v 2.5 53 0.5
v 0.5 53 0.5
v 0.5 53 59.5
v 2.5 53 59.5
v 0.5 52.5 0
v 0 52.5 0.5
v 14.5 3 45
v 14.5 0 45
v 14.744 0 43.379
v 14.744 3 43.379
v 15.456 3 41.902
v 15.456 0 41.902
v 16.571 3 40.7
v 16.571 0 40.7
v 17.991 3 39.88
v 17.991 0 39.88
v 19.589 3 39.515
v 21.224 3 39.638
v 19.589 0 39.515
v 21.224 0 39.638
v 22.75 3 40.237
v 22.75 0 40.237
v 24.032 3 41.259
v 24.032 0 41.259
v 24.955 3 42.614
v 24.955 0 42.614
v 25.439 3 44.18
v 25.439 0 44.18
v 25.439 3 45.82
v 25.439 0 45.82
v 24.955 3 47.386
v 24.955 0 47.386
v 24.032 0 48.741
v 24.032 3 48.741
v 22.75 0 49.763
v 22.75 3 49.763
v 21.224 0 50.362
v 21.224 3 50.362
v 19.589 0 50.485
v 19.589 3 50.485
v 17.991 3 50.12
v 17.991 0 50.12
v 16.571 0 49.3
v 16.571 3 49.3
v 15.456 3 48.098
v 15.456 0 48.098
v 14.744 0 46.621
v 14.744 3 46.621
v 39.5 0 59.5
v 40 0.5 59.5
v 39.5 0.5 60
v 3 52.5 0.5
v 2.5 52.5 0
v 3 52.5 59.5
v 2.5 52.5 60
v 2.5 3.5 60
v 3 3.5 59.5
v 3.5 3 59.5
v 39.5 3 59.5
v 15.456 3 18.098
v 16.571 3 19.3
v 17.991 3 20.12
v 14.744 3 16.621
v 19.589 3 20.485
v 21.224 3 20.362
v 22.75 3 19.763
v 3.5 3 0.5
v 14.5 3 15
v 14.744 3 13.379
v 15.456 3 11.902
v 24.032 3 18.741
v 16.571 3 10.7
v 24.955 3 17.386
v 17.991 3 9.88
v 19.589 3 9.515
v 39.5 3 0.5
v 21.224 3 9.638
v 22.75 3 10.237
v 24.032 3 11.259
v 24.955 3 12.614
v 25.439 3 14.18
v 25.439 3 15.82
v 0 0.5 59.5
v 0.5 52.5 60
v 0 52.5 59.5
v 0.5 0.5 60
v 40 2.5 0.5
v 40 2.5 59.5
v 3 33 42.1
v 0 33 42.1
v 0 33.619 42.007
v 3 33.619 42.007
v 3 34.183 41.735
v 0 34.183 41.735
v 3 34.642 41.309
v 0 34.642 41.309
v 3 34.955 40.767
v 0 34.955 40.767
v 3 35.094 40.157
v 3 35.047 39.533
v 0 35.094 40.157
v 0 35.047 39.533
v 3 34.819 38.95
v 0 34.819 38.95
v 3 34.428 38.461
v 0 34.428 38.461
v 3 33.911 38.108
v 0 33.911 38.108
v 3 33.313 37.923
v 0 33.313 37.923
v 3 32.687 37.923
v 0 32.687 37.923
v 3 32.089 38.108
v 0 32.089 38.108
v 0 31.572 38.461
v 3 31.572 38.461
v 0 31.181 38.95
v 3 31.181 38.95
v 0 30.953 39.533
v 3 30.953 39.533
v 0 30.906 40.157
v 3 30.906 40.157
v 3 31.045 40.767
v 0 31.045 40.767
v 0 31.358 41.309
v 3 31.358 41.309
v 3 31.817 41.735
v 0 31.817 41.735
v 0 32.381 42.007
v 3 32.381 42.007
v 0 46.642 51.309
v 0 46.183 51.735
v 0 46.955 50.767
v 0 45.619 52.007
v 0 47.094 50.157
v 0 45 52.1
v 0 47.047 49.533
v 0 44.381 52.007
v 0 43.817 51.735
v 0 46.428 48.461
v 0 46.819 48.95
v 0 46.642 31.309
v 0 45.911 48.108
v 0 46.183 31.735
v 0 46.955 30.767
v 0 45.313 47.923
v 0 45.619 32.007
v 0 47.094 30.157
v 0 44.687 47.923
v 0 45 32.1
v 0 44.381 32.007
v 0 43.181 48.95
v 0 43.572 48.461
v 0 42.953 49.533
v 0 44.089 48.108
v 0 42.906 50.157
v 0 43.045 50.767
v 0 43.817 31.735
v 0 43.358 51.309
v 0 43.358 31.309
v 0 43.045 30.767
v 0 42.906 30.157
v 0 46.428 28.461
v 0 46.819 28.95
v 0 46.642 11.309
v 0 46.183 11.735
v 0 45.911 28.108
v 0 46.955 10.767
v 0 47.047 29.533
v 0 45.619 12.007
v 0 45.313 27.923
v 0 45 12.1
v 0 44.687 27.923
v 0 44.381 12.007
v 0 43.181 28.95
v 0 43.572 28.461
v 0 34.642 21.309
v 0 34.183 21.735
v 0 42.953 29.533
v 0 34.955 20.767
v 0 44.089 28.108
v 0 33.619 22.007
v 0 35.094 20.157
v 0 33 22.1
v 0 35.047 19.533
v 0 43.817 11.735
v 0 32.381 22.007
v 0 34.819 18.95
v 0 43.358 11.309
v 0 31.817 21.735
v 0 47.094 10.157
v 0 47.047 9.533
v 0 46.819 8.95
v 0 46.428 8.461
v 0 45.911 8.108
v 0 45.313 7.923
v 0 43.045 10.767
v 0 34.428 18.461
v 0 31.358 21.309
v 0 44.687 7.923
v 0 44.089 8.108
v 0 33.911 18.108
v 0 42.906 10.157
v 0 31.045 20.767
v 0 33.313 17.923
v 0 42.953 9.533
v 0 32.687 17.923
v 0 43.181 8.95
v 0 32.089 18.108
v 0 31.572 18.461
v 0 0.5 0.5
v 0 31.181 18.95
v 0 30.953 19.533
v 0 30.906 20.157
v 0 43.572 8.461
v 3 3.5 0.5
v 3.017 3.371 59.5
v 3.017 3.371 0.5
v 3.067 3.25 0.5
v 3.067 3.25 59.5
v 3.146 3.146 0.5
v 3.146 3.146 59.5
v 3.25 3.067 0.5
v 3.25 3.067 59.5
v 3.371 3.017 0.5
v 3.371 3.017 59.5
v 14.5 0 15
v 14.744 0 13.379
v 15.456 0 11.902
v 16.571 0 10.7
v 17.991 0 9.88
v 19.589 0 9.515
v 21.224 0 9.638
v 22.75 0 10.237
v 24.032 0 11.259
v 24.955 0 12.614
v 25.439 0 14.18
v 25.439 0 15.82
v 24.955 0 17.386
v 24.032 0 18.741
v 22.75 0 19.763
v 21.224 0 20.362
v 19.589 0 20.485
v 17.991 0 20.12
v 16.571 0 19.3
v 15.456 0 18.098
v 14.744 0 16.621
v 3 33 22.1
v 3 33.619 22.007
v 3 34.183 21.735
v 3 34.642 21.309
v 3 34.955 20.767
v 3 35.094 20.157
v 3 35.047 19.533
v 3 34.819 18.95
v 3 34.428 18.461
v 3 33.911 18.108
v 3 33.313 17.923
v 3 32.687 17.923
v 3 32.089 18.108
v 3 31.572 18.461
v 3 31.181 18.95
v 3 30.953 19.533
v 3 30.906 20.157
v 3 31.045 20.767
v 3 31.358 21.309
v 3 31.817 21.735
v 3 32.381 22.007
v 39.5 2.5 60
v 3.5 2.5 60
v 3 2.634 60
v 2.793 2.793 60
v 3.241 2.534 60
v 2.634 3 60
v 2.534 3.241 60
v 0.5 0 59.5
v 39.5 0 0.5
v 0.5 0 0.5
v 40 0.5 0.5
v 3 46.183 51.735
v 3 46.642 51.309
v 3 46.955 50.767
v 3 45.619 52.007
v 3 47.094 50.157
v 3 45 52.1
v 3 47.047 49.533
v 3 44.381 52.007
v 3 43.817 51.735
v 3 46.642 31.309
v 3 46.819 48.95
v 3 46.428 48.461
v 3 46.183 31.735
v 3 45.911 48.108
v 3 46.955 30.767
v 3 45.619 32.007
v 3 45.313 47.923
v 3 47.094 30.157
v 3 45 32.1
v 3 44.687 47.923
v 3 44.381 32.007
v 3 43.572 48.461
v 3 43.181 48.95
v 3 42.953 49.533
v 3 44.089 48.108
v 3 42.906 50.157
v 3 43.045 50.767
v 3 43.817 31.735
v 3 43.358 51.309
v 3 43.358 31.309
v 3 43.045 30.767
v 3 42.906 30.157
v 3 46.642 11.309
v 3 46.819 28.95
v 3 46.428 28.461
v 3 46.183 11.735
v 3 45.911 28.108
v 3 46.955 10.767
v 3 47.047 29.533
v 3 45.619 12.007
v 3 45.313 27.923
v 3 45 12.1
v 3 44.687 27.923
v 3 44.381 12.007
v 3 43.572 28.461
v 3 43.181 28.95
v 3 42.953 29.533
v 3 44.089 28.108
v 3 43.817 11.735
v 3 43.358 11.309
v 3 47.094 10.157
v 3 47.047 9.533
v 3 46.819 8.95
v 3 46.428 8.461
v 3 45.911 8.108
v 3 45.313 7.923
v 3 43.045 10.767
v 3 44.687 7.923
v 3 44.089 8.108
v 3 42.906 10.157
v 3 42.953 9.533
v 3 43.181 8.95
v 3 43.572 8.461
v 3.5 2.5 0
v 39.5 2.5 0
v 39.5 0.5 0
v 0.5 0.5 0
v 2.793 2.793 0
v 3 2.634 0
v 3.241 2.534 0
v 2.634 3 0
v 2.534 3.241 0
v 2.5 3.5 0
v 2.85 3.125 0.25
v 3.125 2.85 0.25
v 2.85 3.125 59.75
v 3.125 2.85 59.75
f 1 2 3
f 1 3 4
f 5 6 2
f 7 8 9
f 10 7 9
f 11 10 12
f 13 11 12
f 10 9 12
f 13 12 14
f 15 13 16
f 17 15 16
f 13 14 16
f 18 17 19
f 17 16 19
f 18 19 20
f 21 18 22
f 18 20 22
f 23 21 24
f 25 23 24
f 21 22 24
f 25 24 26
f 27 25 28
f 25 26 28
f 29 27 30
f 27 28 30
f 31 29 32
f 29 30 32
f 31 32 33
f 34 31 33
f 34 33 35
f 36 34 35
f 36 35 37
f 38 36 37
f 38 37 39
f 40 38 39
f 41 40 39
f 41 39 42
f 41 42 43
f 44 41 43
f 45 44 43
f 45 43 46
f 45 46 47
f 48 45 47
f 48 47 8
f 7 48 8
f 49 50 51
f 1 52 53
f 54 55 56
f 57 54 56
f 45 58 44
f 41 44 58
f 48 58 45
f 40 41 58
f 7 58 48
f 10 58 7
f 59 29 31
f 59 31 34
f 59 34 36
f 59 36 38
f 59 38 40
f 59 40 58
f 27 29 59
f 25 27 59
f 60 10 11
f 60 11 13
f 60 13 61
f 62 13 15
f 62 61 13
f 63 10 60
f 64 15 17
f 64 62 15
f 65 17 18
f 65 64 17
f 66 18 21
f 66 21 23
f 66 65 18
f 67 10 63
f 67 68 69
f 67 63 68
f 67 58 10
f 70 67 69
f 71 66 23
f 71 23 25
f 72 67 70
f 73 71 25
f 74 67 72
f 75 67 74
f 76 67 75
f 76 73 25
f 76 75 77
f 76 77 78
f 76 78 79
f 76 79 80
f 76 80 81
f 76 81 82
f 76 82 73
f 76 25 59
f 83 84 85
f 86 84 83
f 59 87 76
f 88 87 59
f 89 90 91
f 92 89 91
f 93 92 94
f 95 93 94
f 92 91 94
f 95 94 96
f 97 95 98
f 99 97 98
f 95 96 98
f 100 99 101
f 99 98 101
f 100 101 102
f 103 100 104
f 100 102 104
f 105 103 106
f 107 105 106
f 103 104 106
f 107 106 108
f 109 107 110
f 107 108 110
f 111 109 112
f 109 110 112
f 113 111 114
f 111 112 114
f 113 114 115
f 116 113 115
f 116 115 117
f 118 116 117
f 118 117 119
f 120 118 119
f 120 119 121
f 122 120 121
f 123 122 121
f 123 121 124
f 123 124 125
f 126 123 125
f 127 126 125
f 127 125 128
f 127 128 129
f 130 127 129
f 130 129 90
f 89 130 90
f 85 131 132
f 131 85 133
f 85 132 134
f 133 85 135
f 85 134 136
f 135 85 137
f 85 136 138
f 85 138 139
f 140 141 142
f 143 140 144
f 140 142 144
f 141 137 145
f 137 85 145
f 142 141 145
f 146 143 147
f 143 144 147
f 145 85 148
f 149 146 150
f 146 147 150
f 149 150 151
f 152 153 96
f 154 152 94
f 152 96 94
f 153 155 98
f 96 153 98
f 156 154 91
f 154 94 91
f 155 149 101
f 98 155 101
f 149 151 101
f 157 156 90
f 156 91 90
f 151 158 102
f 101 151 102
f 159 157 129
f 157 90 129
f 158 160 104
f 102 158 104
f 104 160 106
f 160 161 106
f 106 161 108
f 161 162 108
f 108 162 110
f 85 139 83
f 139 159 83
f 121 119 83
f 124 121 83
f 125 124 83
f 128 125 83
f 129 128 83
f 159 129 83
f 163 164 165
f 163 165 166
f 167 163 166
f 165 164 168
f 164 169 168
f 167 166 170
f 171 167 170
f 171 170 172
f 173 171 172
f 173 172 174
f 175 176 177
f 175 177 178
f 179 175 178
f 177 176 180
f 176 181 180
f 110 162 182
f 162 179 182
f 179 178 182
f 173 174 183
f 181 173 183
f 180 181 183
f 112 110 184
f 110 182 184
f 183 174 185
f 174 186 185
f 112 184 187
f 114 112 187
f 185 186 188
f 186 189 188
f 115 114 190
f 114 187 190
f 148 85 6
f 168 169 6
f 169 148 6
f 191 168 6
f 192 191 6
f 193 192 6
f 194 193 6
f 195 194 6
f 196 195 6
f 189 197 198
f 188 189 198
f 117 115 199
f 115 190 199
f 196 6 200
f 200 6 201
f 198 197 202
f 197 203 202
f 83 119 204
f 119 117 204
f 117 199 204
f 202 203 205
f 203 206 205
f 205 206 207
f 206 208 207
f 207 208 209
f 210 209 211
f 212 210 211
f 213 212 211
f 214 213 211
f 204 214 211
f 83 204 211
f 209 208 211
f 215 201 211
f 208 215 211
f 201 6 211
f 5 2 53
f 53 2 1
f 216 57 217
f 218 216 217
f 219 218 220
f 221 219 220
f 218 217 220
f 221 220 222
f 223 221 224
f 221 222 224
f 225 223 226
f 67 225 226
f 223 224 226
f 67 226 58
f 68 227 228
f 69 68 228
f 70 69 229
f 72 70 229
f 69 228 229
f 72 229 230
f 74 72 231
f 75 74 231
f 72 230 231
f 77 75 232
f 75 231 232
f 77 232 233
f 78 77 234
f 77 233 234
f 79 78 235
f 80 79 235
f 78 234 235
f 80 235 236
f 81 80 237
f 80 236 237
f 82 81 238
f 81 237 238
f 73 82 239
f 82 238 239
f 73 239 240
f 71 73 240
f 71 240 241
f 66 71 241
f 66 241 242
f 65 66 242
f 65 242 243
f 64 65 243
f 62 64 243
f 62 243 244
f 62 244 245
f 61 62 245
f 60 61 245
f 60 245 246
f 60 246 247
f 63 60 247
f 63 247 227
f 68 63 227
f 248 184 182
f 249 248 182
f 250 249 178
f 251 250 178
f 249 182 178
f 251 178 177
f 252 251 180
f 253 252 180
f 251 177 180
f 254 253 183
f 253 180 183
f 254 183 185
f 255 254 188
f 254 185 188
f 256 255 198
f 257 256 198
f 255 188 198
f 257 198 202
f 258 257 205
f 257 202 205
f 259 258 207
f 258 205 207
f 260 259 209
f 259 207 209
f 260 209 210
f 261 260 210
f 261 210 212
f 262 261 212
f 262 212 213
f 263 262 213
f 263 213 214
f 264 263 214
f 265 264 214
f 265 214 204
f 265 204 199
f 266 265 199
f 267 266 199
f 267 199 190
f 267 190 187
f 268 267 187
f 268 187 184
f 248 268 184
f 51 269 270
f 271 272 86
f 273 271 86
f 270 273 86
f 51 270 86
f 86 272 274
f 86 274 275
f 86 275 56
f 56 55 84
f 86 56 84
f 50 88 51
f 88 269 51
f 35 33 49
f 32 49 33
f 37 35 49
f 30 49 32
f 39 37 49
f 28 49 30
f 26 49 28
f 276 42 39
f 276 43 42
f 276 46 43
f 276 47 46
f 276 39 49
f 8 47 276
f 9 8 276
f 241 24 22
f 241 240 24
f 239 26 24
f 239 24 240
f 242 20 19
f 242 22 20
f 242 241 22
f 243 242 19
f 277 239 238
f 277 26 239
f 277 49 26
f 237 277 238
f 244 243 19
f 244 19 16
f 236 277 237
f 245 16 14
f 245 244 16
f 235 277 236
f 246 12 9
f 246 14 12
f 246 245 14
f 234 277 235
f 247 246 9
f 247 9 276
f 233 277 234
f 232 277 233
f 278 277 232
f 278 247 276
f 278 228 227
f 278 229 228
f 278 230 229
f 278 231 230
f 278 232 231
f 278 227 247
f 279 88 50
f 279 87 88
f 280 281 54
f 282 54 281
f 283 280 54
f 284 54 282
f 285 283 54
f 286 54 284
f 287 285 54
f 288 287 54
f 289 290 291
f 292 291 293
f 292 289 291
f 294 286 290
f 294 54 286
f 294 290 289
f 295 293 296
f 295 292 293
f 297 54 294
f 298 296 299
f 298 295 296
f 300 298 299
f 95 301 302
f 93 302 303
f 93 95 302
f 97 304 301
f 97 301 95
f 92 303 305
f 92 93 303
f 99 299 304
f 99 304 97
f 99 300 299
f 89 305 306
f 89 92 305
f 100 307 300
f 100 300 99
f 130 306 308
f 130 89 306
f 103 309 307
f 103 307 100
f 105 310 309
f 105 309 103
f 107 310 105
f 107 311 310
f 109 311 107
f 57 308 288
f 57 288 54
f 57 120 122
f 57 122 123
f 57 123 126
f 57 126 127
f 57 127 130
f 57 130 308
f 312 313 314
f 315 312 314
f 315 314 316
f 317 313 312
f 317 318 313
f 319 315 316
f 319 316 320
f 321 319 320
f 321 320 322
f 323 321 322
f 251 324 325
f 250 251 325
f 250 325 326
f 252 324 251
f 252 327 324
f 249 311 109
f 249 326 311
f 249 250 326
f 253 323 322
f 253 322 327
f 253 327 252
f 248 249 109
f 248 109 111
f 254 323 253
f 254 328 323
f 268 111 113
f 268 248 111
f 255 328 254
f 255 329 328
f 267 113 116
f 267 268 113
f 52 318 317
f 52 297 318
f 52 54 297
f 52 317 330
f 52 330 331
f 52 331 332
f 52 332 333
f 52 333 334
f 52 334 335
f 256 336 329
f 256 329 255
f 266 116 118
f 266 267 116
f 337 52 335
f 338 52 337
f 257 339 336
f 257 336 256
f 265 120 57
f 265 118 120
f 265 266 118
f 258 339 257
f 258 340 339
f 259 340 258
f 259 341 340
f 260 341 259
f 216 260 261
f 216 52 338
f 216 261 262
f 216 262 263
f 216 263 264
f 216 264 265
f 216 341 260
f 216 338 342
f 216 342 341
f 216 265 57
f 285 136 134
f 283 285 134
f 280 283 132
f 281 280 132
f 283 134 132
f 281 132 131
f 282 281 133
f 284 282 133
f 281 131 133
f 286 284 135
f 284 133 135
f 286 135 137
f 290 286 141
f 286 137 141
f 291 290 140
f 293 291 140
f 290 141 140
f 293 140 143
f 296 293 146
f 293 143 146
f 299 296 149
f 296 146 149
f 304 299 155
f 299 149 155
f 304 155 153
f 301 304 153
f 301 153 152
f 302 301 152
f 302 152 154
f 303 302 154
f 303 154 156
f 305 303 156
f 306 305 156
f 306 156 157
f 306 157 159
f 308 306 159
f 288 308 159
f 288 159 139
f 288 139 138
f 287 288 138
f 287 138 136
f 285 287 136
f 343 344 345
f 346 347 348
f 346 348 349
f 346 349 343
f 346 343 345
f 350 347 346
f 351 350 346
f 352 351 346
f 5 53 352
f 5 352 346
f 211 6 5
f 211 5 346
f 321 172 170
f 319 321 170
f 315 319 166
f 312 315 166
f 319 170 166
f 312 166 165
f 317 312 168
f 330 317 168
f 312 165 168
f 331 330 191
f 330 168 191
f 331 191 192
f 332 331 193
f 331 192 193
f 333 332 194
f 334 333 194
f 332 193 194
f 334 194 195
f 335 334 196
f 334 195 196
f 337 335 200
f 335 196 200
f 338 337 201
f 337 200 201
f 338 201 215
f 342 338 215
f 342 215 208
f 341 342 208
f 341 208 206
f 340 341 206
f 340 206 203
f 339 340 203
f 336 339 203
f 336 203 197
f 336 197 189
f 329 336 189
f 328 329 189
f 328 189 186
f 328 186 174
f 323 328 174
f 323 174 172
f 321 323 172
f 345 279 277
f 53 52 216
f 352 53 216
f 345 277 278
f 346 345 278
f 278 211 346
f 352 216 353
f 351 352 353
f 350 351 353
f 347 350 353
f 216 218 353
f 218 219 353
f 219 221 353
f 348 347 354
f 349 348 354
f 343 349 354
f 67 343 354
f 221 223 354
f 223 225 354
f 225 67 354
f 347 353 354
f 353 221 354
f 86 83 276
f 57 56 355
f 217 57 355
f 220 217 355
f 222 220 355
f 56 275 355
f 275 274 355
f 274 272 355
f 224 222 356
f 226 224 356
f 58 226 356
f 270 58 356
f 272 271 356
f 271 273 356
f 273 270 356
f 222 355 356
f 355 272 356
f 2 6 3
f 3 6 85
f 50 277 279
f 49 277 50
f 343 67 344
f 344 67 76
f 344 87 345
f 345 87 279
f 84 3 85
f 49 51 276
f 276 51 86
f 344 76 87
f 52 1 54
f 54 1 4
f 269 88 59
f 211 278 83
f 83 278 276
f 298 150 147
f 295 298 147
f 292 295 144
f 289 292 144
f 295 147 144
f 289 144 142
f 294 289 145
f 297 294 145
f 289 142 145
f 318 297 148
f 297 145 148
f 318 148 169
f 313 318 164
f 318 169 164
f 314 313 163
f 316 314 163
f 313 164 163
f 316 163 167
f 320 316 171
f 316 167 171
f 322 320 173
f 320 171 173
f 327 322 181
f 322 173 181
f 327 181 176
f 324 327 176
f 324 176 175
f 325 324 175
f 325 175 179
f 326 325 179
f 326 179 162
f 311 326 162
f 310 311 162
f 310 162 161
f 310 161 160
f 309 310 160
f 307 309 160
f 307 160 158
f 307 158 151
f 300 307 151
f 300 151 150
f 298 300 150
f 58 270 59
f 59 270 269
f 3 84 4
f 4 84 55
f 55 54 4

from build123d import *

# Parameters (mm, degrees)
DODANIE_WYCI_GNI_CIE1_DEPTH    = 60
OTWORY_USTALAJ_CE_1_0MM1_D     = 11
OTWORY_USTALAJ_CE_1_0MM1_DEPTH = 22.25
OTWORY_USTALAJ_CE_1_0MM1_TIP   = 3.304733405
OTW_R_GWINTOWANY_M51_D         = 4.2
OTW_R_GWINTOWANY_M51_DEPTH     = 14
OTW_R_GWINTOWANY_M51_TIP       = 1.2618073
ZAOKR_GLENIE1_R                = 0.5
SFAZOWANIE3_SIZE               = 0.5


with BuildPart() as part:
    # Szkic1 → Dodanie-wyciągnięcie1 (new body)
    with BuildSketch(Plane.XY):
        Polygon((0, 3), (0, 53), (3, 53), (3, 3), (40, 3), (40, 0), (0, 0), align=None)
    extrude(amount=DODANIE_WYCI_GNI_CIE1_DEPTH)

    # Otwory ustalające Ø1.0mm1
    with Locations(Plane(origin=(0, 3, 0), x_dir=(1, 0, 0), z_dir=(0, 1, 0))):
        with Locations((20, -45), (20, -15)):
            Hole(OTWORY_USTALAJ_CE_1_0MM1_D / 2, depth=OTWORY_USTALAJ_CE_1_0MM1_DEPTH)
            with Locations((0, 0, -(OTWORY_USTALAJ_CE_1_0MM1_DEPTH + OTWORY_USTALAJ_CE_1_0MM1_TIP / 2))):  # 118° drill point
                Cone(0, OTWORY_USTALAJ_CE_1_0MM1_D / 2, OTWORY_USTALAJ_CE_1_0MM1_TIP, mode=Mode.SUBTRACT)

    # Otwór gwintowany M51
    with Locations(Plane(origin=(3, 0, 0), x_dir=(0, 0, -1), z_dir=(1, 0, 0))):
        with Locations((-50, 45), (-40, 33), (-30, 45), (-20, 33), (-10, 45)):
            Hole(OTW_R_GWINTOWANY_M51_D / 2, depth=OTW_R_GWINTOWANY_M51_DEPTH)
            with Locations((0, 0, -(OTW_R_GWINTOWANY_M51_DEPTH + OTW_R_GWINTOWANY_M51_TIP / 2))):  # 118° drill point
                Cone(0, OTW_R_GWINTOWANY_M51_D / 2, OTW_R_GWINTOWANY_M51_TIP, mode=Mode.SUBTRACT)

    # Zaokrąglenie1
    zaokr_glenie1_edges = [part.edges().sort_by_distance(p)[0] for p in [
        (3, 3, 30),
    ]]
    fillet(zaokr_glenie1_edges, radius=ZAOKR_GLENIE1_R)

    # Sfazowanie3
    sfazowanie3_edges = [part.edges().sort_by_distance(p)[0] for p in [
        (0, 53, 30),
        (3, 53, 30),
        (40, 1.5, 60),
        (40, 3, 30),
        (40, 0, 30),
        (0, 0, 30),
        (21.75, 3, 60),
        (1.5, 53, 60),
        (0, 26.5, 60),
        (3, 28.25, 0),
        (3, 28.25, 60),
        (3.146446609, 3.146446609, 0),
        (3.146446609, 3.146446609, 60),
        (0, 26.5, 0),
        (1.5, 53, 0),
        (21.75, 3, 0),
        (20, 0, 60),
        (40, 1.5, 0),
        (20, 0, 0),
    ]]
    chamfer(sfazowanie3_edges, length=SFAZOWANIE3_SIZE)


solid = part.part
